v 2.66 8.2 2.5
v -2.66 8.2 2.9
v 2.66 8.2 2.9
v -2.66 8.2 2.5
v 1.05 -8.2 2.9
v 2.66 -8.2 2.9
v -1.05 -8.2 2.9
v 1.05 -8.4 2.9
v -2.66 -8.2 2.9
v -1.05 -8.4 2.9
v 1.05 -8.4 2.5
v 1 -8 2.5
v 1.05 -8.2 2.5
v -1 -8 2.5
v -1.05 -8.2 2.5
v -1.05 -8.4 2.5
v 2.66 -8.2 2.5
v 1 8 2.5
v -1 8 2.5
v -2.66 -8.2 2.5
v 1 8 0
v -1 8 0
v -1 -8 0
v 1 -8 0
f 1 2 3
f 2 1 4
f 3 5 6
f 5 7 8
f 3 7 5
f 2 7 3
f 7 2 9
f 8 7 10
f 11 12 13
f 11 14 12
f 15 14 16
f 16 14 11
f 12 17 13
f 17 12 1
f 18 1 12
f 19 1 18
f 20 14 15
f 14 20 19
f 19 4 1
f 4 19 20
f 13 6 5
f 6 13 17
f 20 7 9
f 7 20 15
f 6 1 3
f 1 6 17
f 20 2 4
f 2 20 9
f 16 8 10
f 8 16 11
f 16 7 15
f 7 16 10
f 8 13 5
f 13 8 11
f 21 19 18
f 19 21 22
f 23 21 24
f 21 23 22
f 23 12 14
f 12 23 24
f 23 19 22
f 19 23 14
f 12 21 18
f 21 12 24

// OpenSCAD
/**
  * Module: PCI connector placeholder
  *
  * Author: Karim Aziiev <karim.aziiev@gmail.com>
  * License: GPL-3.0-or-later
  */

include <../../colors.scad>
include <../../parameters.scad>
include <../presets.scad>

use <../../lib/functions.scad>
use <../../lib/plist.scad>
use <../../lib/shapes3d.scad>
use <../../lib/transforms.scad>

/**
  ─────────────────────────────────────────────────────────────────────────────
  pci_connector_size_from_plist
  ─────────────────────────────────────────────────────────────────────────────
  Return the oriented nominal body size of a PCI/CSI connector.

  **Parameters:**
  - `plist`: Connector properties; omitted size defaults to `[16, 2, 2.5]`.
  - `orientation`: Optional override of the plist orientation, default `"lwh"`.
  **Returns:** Oriented `[width, length, height]` used for body anchoring.

  Latch overhang and latch thickness are excluded from this reference box.
 */
function pci_connector_size_from_plist(plist=pci_connector_plist, orientation) =
  assert(plist_is(plist) && len(plist) > 0, "Supply a hardware specification")
  let (size = plist_get("size", plist, [16, 2, 2.5]),
       orientation = with_default(orientation,
                                  plist_get("orientation", plist, "lwh")))
  orientation_size(orientation, size);

/**
  ─────────────────────────────────────────────────────────────────────────────
  pci_connector_oriented_size
  ─────────────────────────────────────────────────────────────────────────────
  Return the nominal connector size in an explicit orientation.

  **Parameters:**
  - `plist`: Connector properties, including optional `size`.
  - `orientation`: Orientation to use; defaults to `"lwh"`.
  **Returns:** Oriented `[width, length, height]`, excluding the latch.
 */
function pci_connector_oriented_size(plist, orientation="lwh") =
  pci_connector_size_from_plist(plist, orientation);

/**
  ─────────────────────────────────────────────────────────────────────────────
  pci_connector
  ─────────────────────────────────────────────────────────────────────────────
  Create a flat cable connector with an overhanging latch.

  **Parameters:**
  - `size`: Nominal body `[width, length, height]` before orientation.
  - `latch_pad`: Width of each latch edge; `undef` uses 23% of body length.
  - `color`: Body color.
  - `latch_color`: Latch color.
  - `anchor`: Placement against the oriented body box; default `[0, 0, 1]`.
  - `latch_thickness`: Latch height and overhang allowance; `undef` uses 0.4.
  - `orientation`: Axis convention for the body, default `"lwh"`.

  The reference size excludes latch overhang and additional latch height.
 */
module pci_connector(size=[16.0, 2, 2.5],
                     latch_pad=3.66,
                     color=metallic_yellow_silver_2,
                     latch_color=jet_black,
                     anchor=[0, 0, 1],
                     latch_thickness = 0.4,
                     orientation="lwh") {
  latch_w = size[0] / 2;
  latch_pad = with_default(latch_pad, size[1] * 0.23);
  latch_thickness = with_default(latch_thickness, 0.4);
  h = size[2];

  with_orientation(from="wlh", to=orientation, anchor=anchor, size=size) {
    union() {
      color(color) {
        cuboid(size=size);
      }
      color(latch_color, alpha=1) {
        translate([0, 0, h]) {
          translate([-size[0] / 2 - latch_thickness, 0, 0]) {
            cuboid(size=[latch_w + latch_thickness, size [1] + 0.1, latch_thickness],
                   anchor=[1, 0, 1]);
          }

          mirror_copy([0, 1, 0]) {
            translate([0, size[1] / 2 - latch_pad / 2, 0]) {
              cuboid(size=[size[0] + latch_thickness, latch_pad, latch_thickness]);
            }
          }
        }
      }
    }
  }
}

/**
  ─────────────────────────────────────────────────────────────────────────────
  pci_connector_from_plist
  ─────────────────────────────────────────────────────────────────────────────
  Render a PCI/CSI connector from its property list.

  **Parameters:**
  - `plist`: `pci_connector` properties; missing keys use its module defaults.
  - `anchor`: Optional override of the plist anchor, default `[0, 0, 1]`.
  - `orientation`: Optional override of the plist orientation, default `"lwh"`.

  Anchoring uses the nominal body box. The latch extends beyond that box.
 */
module pci_connector_from_plist(plist=pci_connector_plist, anchor, orientation) {
  assert(plist_is(plist) && len(plist) > 0, "Supply a hardware specification");
  size = plist_get("size", plist, [16, 2, 2.5]);
  latch_pad = plist_get("latch_pad", plist, 3.66);
  color = plist_get("color", plist, metallic_yellow_silver_2);
  latch_color = plist_get("latch_color", plist, jet_black);
  anchor = with_default(anchor, plist_get("anchor", plist, [0, 0, 1]));
  orientation = with_default(orientation,
                             plist_get("orientation", plist, "lwh"));
  latch_thickness = plist_get("latch_thickness", plist, 0.4);

  pci_connector(size=size,
                latch_pad=latch_pad,
                color=color,
                latch_color=latch_color,
                anchor=anchor,
                latch_thickness=latch_thickness,
                orientation=orientation);
}

pci_connector(size=[16.0, 2, 2.5],
              latch_pad=3.66,
              color=metallic_yellow_silver_2,
              latch_color=jet_black,
              anchor=[0, 0, 1],
              latch_thickness = 0.4,
              orientation="lwh");
